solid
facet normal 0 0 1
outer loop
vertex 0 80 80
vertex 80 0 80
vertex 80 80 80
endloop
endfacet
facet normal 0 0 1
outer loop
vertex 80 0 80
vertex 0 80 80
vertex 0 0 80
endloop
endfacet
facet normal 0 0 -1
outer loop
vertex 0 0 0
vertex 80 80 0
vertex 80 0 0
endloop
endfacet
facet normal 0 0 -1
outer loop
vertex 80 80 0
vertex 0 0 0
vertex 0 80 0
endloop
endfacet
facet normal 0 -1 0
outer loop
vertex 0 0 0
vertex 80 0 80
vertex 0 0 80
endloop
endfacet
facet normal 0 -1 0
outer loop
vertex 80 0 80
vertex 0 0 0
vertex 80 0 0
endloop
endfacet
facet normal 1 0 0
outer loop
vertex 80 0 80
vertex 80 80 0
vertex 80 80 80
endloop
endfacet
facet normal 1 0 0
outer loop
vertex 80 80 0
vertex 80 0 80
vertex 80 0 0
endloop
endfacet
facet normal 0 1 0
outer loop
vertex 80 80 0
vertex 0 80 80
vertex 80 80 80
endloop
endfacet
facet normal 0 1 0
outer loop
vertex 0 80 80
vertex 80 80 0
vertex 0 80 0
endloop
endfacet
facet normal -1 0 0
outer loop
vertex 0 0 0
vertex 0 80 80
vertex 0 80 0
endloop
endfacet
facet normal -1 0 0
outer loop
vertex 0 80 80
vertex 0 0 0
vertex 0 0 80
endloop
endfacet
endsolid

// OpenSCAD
// file: tetrahedron.scad
module create_tetrahedra(tetrahedron_count, tetrahedron_indices) {
    for (i = [0:tetrahedron_count-1]) {
        vertex_indices = tetrahedron_indices[i];

        tetrahedron_vertices = [
            edges_and_corners[vertex_indices[0]],
            edges_and_corners[vertex_indices[1]],
            edges_and_corners[vertex_indices[2]],
            edges_and_corners[vertex_indices[3]]
        ];

        tetrahedron(tetrahedron_vertices, tetrahedron_colors[i]);
    }
}

module tetrahedron(tetrahedron_vertices, tetrahedron_color) {
    color(tetrahedron_color) polyhedron(points=tetrahedron_vertices, faces=[[0, 1, 2], [0, 2, 3], [0, 3, 1], [1, 2, 3]]);
}
// file: cube.scad
size = 80;
alpha = 0.5;

   edges = [
        [size/2, 0, 0],
        [size, size/2, 0],
        [size/2, size, 0],
        [0, size/2, 0],
        [size/2, 0, size],
        [size, size/2, size],
        [size/2, size, size],
        [0, size/2, size],
        [0, 0, size/2],
        [size, 0, size/2],
        [size, size, size/2],
        [0, size, size/2],
    ];

    corners = [
        [0, 0, 0],
        [size, 0, 0],
        [size, size, 0],
        [0, size, 0],
        [0, 0, size],
        [size, 0, size],
        [size, size, size],
        [0, size, size],
    ];

    edges_and_corners = concat(edges, corners);

module labeled_cube() {
  translate([0, 0, 0]) {
    color([1, 1, 1, 0.5]) cube(size, center=false); // create a transparent cube with the given size, centered at the given corner coordinates

    // label the corner points
    // We are adjusting the labels by custom offsets and rotations.
    translate(corners[0]+[0, 0, -5]) rotate([90, 0, 0]) text("C12", size=5);
    translate(corners[1]+[0, 0, -5]) rotate([90, 0, 0]) text("C13", size=5);
    translate(corners[2]+[0, 0, -5]) rotate([90, 0, 0]) text("C14", size=5);
    translate(corners[3]+[0, 0, -5]) rotate([90, 0, 0]) text("C15", size=5);
    translate(corners[4]) rotate([90, 0, 0]) text("C16", size=5);
    translate(corners[5]) rotate([90, 0, 0]) text("C17", size=5);
    translate(corners[6]) rotate([90, 0, 0]) text("C18", size=5);
    translate(corners[7]) rotate([90, 0, 0]) text("C19", size=5);

    // label the edges
    // We are adjusting the labels by custom offsets and rotations.
    translate(edges[0]+[0, 0, -5]) rotate([90, 0, 0]) text("E0", size=5);
    translate(edges[1]+[0, -3, -5]) rotate([90, 0, 90]) text("E1", size=5);
    translate(edges[2]+[5, 0, -5]) rotate([90, 0, 180]) text("E2", size=5);
    translate(edges[3]+[0, 0, -5]) rotate([90, 0, -90]) text("E3", size=5);
    translate(edges[4]+[0, 0, 2]) rotate([90, 0, 0]) text("E4", size=5);
    translate(edges[5]+[0, -3, 2]) rotate([90, 0, 90]) text("E5", size=5);
    translate(edges[6]+[5, 0, 2]) rotate([90, 0, 180]) text("E6", size=5);
    translate(edges[7]+[0, 3, 2]) rotate([90, 0, -90]) text("E7", size=5);
    translate(edges[8]+[-1, 0, 0]) rotate([0, -90, 90]) text("E8", size=5);
    translate(edges[9]+[5, 0, 0]) rotate([90, -90, 0]) text("E9", size=5);
    translate(edges[10]+[1, 0, 0]) rotate([180, -90, 90]) text("E10", size=5);
    translate(edges[11]+[-1, 0, 0]) rotate([0, -90, 0]) text("E11", size=5);
  }
}
// main file
// When all 8 corners of the cube have zero or negative values.
// It means the whole cube is on/inside the 3D model.
// In this case, 6 tetrahedra are generated for the whole cube.

include <cube.scad>;
include <tetrahedron.scad>

tetrahedron_count = 6;

tetrahedron_indices = [
        [12+0, 12+4, 12+7, 12+6],
        [12+0, 12+3, 12+7, 12+6],
        [12+0, 12+4, 12+5, 12+6],
        [12+0, 12+1, 12+5, 12+6],
        [12+0, 12+3, 12+2, 12+6],
        [12+0, 12+1, 12+2, 12+6],
    ];

tetrahedron_colors = [
    [1, 0, 0, alpha],  // red
    [0, 1, 0, alpha],  // green
    [0, 0, 1, alpha],  // blue
    [1, 1, 0, alpha],  // yellow
    [1, 0, 1, alpha],  // magenta
    [0, 1, 1, alpha]   // cyan
];

create_tetrahedra(tetrahedron_count = tetrahedron_count, tetrahedron_indices = tetrahedron_indices);

// Just to be able to visualize the created tetrahedra with respect to the cube.
labeled_cube();
